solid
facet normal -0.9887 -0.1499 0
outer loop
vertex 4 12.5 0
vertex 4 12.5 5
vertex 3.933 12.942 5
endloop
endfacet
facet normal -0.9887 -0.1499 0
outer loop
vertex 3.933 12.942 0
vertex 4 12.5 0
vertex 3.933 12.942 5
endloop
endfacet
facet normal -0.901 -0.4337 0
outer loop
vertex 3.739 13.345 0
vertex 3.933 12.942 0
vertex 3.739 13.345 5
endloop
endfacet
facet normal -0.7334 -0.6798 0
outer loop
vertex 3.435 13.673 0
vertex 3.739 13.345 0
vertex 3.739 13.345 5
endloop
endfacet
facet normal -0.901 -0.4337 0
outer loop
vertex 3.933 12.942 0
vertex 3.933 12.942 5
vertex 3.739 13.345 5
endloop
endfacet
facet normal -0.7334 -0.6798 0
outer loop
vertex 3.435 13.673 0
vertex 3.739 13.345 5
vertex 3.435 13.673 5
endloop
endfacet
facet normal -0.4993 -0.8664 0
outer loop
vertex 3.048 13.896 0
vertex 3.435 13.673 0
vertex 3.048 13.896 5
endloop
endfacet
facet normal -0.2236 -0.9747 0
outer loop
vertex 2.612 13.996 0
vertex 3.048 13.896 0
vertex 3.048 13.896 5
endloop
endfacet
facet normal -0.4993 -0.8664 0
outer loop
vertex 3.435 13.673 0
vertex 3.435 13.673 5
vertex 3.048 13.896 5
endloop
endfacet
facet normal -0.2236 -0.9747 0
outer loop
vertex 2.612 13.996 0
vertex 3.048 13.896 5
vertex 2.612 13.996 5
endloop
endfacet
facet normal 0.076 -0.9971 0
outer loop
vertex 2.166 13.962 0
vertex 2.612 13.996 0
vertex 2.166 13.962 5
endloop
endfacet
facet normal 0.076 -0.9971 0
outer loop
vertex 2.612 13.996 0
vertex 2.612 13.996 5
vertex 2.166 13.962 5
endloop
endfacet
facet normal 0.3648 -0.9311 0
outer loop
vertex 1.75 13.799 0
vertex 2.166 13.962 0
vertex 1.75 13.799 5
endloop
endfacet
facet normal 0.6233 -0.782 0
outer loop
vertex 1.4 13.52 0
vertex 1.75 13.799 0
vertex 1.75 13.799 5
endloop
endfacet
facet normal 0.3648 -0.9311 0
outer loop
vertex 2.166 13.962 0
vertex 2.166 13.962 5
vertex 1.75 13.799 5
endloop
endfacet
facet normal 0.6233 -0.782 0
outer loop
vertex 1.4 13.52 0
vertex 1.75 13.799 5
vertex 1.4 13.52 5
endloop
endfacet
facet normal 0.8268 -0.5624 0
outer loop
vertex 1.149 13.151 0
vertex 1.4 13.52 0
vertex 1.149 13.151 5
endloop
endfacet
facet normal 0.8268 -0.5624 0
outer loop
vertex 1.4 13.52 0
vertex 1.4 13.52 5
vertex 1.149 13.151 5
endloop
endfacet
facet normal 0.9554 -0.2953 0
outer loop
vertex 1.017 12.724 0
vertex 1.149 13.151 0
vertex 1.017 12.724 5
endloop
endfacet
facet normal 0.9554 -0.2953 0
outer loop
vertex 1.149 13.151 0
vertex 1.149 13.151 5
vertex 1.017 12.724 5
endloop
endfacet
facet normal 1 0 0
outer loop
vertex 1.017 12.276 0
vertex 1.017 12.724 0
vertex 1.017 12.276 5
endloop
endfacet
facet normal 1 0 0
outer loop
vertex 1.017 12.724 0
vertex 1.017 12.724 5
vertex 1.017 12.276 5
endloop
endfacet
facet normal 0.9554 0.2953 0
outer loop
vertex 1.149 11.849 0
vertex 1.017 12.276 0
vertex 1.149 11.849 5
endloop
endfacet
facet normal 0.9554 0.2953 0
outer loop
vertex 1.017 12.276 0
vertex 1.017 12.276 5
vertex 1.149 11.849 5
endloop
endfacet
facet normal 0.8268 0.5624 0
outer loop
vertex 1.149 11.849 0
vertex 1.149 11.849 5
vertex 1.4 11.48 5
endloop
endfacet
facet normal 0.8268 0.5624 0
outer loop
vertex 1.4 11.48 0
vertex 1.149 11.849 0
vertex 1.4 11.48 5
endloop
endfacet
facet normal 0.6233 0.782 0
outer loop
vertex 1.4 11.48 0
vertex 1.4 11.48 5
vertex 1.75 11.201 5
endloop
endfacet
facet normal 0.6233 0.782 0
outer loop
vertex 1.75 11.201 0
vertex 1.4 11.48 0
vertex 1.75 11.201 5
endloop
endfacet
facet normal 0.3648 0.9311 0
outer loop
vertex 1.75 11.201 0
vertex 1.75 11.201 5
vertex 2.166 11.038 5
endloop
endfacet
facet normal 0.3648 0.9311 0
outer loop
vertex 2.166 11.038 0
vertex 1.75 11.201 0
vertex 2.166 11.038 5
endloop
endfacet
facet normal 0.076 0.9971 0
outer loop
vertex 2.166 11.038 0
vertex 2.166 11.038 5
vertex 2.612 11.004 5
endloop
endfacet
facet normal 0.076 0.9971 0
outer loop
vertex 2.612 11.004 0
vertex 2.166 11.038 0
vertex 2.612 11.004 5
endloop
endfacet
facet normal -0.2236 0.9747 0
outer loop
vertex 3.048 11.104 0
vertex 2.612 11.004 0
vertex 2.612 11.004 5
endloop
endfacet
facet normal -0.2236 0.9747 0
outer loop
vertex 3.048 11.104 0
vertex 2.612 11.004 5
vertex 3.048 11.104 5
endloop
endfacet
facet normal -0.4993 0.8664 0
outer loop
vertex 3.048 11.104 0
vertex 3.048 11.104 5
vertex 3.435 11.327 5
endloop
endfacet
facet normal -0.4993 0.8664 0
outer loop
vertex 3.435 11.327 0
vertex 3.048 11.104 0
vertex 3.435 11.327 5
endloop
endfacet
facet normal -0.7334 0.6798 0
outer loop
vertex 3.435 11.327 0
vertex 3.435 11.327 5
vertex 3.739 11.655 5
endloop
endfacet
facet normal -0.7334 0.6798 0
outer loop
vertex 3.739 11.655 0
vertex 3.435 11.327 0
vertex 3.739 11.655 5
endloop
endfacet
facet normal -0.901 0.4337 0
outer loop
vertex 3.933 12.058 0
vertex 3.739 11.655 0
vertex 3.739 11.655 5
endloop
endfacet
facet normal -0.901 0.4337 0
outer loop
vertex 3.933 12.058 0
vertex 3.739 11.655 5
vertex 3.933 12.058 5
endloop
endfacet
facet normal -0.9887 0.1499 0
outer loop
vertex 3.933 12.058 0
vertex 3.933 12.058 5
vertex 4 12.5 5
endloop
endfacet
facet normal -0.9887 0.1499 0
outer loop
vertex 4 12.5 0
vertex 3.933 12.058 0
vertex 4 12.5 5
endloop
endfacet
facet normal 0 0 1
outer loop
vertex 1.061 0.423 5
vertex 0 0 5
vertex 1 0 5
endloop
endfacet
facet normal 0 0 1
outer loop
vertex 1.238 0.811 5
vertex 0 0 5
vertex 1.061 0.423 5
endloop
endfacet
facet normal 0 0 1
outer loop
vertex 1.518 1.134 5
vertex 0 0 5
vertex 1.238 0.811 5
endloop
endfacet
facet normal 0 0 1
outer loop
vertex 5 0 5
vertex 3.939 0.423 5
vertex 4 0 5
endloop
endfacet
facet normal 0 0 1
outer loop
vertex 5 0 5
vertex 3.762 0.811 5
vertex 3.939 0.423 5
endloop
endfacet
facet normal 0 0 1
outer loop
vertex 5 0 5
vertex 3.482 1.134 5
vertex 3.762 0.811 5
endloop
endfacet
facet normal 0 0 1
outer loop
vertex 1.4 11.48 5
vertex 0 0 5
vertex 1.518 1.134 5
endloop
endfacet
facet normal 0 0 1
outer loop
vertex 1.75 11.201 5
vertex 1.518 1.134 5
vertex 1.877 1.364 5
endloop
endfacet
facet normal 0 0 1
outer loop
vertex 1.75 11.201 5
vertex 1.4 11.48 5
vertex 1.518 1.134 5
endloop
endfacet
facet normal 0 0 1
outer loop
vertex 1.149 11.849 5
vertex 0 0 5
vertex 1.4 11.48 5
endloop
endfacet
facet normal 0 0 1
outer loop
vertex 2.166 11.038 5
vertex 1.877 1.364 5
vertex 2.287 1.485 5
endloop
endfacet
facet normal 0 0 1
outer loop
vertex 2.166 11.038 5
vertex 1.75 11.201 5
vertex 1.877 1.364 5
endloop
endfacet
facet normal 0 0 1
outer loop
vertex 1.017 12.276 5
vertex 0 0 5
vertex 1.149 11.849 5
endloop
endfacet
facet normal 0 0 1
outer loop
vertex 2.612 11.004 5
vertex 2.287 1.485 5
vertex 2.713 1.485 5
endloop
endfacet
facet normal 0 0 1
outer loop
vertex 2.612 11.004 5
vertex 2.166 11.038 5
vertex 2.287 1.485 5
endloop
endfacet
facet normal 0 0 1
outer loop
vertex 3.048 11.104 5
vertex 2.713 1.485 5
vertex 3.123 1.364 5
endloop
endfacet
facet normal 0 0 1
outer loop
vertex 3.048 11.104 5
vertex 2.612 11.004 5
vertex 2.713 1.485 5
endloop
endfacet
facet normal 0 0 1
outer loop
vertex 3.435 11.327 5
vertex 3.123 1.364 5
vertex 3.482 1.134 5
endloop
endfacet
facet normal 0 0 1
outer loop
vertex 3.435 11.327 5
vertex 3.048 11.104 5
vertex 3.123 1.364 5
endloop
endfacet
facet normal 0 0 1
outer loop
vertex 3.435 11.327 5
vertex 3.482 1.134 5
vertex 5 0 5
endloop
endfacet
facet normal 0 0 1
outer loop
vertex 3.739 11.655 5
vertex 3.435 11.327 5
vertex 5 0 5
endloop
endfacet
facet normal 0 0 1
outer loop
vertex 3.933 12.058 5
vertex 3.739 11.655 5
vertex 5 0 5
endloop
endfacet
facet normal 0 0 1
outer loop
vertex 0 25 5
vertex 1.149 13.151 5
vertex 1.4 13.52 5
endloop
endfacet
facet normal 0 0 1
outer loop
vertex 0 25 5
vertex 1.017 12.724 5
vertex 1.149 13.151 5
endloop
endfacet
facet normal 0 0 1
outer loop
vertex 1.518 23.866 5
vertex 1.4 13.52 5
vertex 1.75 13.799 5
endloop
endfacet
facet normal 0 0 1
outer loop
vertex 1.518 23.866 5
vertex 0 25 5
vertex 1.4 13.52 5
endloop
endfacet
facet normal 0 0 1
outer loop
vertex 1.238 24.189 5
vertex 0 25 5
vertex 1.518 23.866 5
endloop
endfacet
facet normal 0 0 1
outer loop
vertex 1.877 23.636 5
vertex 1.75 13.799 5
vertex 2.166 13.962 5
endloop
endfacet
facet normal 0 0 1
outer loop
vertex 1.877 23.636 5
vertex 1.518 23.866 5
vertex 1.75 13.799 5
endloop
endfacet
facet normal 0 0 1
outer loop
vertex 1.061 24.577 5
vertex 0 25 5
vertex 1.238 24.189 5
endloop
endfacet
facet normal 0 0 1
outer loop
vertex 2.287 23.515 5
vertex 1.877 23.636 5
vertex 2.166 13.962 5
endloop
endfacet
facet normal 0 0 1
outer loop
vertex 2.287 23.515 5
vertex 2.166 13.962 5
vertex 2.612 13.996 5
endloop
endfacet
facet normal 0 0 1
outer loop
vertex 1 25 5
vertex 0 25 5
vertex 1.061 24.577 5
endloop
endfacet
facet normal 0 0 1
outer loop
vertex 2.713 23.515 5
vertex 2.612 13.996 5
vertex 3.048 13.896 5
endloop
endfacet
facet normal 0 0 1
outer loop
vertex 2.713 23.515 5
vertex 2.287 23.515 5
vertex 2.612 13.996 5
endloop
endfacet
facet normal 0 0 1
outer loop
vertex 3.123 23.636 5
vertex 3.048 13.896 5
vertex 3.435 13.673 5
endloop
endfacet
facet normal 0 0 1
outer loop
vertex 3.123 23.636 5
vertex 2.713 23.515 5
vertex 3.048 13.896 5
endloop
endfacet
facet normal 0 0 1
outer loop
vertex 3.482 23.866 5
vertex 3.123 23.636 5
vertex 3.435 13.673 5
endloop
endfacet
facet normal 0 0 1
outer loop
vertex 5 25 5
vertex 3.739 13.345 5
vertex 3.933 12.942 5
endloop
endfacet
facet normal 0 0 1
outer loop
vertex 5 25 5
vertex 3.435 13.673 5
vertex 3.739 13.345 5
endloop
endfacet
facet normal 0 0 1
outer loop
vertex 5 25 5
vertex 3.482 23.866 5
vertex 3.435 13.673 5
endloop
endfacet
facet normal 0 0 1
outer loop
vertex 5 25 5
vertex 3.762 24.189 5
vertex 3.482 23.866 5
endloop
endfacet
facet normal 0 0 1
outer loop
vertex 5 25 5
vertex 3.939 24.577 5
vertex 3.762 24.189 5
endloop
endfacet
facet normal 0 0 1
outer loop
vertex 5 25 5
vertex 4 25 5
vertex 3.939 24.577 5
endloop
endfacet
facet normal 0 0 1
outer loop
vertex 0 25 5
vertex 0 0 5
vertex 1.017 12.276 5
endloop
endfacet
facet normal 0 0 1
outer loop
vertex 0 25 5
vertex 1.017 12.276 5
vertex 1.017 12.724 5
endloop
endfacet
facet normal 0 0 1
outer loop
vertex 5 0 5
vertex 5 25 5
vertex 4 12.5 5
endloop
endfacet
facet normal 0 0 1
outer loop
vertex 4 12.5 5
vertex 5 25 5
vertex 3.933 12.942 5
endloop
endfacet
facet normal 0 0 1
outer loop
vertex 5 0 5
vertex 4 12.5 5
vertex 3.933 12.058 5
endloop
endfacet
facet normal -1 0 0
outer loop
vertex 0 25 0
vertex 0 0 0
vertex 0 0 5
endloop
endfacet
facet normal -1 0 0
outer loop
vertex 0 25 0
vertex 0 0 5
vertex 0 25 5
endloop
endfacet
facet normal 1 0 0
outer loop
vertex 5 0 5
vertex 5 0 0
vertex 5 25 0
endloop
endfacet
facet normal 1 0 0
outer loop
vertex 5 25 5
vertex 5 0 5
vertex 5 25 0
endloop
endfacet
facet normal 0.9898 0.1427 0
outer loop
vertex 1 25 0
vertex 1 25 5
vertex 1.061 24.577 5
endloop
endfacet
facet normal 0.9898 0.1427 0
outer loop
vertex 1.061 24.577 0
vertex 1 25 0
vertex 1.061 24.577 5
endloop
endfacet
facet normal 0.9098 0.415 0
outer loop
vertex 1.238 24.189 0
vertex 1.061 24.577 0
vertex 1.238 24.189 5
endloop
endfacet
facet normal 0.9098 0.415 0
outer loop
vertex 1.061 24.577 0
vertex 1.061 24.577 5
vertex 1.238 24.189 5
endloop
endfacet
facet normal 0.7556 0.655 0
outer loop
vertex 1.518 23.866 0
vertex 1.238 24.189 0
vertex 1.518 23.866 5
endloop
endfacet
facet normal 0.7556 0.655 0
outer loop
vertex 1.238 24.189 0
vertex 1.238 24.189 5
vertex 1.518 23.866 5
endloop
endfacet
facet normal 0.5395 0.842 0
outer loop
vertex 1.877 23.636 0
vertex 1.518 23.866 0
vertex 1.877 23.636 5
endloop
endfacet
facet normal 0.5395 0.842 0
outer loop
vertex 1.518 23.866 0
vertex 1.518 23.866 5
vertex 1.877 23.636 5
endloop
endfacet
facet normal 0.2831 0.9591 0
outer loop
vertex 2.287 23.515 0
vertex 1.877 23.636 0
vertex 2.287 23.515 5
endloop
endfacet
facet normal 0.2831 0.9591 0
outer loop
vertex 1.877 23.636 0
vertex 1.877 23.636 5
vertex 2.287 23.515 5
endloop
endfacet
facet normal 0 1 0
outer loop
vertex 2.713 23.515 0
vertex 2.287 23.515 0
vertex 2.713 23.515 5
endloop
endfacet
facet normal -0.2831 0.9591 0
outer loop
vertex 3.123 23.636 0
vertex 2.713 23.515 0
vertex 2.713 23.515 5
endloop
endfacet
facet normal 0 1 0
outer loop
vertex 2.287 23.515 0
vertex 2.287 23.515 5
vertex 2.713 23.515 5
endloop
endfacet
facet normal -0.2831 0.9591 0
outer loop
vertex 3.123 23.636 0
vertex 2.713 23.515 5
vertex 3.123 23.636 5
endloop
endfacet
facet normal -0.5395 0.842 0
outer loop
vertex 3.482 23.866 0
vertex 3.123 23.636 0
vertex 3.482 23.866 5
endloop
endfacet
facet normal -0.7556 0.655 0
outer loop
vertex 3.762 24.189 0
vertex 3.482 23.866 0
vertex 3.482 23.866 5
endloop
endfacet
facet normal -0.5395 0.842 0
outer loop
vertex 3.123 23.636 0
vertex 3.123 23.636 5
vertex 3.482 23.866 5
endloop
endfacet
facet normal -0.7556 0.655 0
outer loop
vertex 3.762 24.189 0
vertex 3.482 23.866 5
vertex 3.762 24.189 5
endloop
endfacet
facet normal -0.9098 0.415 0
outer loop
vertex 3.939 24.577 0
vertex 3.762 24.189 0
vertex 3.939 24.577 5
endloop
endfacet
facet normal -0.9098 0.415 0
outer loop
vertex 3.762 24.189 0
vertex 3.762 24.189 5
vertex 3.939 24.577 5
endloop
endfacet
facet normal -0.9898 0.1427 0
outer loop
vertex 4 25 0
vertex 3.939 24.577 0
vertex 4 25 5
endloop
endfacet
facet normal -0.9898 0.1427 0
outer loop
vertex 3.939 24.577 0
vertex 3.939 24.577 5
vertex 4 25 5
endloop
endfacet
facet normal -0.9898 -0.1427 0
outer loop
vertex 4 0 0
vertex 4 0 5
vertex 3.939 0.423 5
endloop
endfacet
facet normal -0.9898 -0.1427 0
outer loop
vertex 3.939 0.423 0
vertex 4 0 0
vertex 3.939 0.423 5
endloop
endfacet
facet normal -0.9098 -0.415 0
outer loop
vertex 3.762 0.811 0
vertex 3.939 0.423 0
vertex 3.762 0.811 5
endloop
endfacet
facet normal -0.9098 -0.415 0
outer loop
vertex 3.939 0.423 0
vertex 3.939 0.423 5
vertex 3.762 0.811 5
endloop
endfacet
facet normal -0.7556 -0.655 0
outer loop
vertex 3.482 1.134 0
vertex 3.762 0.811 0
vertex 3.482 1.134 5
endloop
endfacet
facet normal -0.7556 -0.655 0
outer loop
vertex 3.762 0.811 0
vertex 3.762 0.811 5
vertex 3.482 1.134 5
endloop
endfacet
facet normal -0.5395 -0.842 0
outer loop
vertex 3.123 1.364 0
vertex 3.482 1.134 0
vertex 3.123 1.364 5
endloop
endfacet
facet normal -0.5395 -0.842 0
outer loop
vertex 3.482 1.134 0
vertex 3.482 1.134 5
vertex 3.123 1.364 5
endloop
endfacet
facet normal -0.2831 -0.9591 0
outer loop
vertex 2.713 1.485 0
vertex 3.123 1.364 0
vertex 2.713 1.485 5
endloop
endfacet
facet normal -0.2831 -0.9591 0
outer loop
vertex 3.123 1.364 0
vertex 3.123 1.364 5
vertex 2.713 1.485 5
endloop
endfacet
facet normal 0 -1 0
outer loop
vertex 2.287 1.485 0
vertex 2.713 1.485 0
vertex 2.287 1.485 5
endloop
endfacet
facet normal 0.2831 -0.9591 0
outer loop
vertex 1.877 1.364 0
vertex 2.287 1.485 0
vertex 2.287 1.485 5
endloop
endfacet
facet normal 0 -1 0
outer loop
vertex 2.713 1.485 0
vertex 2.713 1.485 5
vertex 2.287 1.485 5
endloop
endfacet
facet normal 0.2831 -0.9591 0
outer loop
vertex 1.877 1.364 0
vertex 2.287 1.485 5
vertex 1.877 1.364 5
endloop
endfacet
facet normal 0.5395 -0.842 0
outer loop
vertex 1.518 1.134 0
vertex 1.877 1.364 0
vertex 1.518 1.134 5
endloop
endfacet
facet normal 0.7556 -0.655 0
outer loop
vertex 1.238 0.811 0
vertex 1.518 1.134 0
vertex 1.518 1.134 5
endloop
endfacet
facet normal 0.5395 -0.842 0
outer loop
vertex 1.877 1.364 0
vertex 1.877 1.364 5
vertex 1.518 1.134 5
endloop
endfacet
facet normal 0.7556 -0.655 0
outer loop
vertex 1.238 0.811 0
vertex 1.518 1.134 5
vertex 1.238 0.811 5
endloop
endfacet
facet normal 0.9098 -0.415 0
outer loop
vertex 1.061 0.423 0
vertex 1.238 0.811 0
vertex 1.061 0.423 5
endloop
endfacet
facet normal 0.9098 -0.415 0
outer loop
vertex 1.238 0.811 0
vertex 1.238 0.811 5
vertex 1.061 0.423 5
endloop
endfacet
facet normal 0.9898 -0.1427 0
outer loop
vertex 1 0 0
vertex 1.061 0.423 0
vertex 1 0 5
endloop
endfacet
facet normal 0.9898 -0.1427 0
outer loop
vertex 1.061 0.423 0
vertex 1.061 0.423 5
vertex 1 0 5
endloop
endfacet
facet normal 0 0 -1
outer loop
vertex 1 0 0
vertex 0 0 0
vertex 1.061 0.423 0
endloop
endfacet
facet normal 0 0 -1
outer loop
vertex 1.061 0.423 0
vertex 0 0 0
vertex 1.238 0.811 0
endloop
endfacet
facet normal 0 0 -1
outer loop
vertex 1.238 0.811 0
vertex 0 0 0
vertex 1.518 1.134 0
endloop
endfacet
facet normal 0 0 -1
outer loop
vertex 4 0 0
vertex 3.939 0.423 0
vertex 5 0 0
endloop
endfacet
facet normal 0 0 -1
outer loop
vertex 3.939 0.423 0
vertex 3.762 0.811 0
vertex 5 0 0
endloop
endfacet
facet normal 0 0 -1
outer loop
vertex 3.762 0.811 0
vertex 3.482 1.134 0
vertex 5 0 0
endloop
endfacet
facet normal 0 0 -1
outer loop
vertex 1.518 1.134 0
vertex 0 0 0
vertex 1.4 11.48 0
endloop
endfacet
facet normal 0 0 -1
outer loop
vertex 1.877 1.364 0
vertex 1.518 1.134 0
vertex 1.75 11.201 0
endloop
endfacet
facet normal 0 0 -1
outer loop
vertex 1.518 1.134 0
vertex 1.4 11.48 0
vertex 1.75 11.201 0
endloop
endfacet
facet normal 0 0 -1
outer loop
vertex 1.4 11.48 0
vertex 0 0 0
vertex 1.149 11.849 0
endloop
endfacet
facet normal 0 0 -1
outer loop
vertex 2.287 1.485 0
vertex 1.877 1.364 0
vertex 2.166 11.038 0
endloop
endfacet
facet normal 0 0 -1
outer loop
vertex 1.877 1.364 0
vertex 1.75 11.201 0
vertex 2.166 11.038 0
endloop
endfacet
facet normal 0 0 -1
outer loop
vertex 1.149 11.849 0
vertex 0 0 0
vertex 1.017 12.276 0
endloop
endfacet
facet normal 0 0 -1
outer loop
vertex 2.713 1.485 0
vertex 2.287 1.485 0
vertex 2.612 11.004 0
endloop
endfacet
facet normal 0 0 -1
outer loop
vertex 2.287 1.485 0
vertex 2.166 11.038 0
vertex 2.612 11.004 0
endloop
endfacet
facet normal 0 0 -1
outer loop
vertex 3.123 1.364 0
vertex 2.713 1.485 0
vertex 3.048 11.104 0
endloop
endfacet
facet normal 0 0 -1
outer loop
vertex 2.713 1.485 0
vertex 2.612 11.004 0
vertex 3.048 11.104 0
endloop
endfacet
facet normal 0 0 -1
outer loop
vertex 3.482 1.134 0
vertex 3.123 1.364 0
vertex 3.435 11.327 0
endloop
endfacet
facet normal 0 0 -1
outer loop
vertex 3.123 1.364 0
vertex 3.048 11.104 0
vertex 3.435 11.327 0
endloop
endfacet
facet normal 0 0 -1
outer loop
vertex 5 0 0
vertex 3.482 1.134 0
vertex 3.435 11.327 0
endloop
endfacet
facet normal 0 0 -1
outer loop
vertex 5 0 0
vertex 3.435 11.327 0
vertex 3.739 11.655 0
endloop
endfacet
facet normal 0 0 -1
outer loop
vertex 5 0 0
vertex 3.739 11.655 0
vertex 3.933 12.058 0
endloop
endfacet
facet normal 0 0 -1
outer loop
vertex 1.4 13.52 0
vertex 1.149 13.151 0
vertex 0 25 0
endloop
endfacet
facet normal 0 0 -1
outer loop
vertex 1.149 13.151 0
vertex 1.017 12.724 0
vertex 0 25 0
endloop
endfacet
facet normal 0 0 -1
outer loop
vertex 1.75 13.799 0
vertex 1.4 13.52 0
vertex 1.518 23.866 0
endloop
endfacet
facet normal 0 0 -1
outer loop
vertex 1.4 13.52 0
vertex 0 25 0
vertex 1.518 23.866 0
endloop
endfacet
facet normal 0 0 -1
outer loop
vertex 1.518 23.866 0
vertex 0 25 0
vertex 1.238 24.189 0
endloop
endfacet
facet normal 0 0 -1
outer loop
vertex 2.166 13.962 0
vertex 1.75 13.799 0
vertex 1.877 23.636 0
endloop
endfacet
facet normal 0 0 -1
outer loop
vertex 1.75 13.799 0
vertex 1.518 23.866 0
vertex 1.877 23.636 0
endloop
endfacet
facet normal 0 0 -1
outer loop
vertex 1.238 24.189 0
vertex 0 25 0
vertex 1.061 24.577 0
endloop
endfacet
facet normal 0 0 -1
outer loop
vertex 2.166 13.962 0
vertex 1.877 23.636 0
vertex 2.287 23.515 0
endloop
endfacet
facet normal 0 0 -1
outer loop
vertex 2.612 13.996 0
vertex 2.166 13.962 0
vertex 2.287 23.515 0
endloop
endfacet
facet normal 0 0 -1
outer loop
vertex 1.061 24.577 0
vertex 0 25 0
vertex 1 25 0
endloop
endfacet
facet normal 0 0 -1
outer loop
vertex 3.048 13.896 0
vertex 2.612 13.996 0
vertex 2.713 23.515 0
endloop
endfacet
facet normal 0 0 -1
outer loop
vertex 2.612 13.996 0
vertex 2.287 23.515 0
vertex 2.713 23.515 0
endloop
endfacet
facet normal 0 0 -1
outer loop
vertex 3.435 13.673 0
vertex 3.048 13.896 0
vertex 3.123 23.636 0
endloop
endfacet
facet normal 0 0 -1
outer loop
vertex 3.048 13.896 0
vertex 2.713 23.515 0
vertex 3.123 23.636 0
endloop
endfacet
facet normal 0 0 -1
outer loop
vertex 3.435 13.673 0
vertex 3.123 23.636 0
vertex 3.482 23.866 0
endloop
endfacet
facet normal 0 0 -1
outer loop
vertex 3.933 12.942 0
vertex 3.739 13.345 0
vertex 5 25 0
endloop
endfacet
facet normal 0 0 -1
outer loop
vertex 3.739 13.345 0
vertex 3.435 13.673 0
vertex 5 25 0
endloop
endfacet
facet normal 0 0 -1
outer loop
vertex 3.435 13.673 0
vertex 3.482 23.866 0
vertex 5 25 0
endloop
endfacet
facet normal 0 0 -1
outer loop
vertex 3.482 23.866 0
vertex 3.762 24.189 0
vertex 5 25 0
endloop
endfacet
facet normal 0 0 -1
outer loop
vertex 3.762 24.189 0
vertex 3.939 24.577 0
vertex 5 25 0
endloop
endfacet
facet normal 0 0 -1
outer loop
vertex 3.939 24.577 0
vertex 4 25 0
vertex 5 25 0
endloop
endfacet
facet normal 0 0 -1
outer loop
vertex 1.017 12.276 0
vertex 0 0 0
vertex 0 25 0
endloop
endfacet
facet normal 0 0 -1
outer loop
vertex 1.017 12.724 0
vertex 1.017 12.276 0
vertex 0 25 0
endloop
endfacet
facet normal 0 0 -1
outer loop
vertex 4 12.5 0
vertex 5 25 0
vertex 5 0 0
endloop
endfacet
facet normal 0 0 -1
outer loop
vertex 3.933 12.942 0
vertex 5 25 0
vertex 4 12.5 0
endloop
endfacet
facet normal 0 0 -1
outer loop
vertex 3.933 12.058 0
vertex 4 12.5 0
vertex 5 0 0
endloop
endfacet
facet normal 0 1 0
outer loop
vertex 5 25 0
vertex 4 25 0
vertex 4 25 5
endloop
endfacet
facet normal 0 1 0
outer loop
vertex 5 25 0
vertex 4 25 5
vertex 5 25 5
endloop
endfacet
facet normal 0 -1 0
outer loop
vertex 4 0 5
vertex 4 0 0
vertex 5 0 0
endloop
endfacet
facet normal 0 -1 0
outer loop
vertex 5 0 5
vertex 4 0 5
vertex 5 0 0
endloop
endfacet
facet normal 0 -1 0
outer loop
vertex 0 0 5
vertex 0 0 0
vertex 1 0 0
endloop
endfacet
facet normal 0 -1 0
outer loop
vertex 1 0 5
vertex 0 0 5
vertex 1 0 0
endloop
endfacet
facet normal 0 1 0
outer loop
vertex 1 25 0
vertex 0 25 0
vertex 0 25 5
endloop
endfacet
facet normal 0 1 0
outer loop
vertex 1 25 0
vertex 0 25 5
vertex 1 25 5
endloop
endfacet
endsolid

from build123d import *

# Parameters (mm, degrees)
F1_W     = 5
F1_H     = 25
F2_DEPTH = 5
F3_R     = 1.5
F4_DEPTH = 5.001


with BuildPart() as f2:
    # F1 (on Top) → F2 (new body)
    with BuildSketch(Plane.XY):
        with Locations((2.5, 12.5)):
            Rectangle(F1_W, F1_H)
    extrude(amount=F2_DEPTH)

    # F3 (on face) → F4 (cut, through all)
    with BuildSketch(Plane.XY.offset(5)):
        with Locations((2.5, 12.5)):
            Circle(F3_R)
        with BuildLine():
            Line((1, 0), (4, 0))
            ThreePointArc((4, 0), (2.5, 1.5), (1, 0))
        make_face()
        with BuildLine():
            ThreePointArc((1, 25), (2.5, 23.5), (4, 25))
            Line((4, 25), (1, 25))
        make_face()
    extrude(amount=-F4_DEPTH, mode=Mode.SUBTRACT)


solid = f2.part
